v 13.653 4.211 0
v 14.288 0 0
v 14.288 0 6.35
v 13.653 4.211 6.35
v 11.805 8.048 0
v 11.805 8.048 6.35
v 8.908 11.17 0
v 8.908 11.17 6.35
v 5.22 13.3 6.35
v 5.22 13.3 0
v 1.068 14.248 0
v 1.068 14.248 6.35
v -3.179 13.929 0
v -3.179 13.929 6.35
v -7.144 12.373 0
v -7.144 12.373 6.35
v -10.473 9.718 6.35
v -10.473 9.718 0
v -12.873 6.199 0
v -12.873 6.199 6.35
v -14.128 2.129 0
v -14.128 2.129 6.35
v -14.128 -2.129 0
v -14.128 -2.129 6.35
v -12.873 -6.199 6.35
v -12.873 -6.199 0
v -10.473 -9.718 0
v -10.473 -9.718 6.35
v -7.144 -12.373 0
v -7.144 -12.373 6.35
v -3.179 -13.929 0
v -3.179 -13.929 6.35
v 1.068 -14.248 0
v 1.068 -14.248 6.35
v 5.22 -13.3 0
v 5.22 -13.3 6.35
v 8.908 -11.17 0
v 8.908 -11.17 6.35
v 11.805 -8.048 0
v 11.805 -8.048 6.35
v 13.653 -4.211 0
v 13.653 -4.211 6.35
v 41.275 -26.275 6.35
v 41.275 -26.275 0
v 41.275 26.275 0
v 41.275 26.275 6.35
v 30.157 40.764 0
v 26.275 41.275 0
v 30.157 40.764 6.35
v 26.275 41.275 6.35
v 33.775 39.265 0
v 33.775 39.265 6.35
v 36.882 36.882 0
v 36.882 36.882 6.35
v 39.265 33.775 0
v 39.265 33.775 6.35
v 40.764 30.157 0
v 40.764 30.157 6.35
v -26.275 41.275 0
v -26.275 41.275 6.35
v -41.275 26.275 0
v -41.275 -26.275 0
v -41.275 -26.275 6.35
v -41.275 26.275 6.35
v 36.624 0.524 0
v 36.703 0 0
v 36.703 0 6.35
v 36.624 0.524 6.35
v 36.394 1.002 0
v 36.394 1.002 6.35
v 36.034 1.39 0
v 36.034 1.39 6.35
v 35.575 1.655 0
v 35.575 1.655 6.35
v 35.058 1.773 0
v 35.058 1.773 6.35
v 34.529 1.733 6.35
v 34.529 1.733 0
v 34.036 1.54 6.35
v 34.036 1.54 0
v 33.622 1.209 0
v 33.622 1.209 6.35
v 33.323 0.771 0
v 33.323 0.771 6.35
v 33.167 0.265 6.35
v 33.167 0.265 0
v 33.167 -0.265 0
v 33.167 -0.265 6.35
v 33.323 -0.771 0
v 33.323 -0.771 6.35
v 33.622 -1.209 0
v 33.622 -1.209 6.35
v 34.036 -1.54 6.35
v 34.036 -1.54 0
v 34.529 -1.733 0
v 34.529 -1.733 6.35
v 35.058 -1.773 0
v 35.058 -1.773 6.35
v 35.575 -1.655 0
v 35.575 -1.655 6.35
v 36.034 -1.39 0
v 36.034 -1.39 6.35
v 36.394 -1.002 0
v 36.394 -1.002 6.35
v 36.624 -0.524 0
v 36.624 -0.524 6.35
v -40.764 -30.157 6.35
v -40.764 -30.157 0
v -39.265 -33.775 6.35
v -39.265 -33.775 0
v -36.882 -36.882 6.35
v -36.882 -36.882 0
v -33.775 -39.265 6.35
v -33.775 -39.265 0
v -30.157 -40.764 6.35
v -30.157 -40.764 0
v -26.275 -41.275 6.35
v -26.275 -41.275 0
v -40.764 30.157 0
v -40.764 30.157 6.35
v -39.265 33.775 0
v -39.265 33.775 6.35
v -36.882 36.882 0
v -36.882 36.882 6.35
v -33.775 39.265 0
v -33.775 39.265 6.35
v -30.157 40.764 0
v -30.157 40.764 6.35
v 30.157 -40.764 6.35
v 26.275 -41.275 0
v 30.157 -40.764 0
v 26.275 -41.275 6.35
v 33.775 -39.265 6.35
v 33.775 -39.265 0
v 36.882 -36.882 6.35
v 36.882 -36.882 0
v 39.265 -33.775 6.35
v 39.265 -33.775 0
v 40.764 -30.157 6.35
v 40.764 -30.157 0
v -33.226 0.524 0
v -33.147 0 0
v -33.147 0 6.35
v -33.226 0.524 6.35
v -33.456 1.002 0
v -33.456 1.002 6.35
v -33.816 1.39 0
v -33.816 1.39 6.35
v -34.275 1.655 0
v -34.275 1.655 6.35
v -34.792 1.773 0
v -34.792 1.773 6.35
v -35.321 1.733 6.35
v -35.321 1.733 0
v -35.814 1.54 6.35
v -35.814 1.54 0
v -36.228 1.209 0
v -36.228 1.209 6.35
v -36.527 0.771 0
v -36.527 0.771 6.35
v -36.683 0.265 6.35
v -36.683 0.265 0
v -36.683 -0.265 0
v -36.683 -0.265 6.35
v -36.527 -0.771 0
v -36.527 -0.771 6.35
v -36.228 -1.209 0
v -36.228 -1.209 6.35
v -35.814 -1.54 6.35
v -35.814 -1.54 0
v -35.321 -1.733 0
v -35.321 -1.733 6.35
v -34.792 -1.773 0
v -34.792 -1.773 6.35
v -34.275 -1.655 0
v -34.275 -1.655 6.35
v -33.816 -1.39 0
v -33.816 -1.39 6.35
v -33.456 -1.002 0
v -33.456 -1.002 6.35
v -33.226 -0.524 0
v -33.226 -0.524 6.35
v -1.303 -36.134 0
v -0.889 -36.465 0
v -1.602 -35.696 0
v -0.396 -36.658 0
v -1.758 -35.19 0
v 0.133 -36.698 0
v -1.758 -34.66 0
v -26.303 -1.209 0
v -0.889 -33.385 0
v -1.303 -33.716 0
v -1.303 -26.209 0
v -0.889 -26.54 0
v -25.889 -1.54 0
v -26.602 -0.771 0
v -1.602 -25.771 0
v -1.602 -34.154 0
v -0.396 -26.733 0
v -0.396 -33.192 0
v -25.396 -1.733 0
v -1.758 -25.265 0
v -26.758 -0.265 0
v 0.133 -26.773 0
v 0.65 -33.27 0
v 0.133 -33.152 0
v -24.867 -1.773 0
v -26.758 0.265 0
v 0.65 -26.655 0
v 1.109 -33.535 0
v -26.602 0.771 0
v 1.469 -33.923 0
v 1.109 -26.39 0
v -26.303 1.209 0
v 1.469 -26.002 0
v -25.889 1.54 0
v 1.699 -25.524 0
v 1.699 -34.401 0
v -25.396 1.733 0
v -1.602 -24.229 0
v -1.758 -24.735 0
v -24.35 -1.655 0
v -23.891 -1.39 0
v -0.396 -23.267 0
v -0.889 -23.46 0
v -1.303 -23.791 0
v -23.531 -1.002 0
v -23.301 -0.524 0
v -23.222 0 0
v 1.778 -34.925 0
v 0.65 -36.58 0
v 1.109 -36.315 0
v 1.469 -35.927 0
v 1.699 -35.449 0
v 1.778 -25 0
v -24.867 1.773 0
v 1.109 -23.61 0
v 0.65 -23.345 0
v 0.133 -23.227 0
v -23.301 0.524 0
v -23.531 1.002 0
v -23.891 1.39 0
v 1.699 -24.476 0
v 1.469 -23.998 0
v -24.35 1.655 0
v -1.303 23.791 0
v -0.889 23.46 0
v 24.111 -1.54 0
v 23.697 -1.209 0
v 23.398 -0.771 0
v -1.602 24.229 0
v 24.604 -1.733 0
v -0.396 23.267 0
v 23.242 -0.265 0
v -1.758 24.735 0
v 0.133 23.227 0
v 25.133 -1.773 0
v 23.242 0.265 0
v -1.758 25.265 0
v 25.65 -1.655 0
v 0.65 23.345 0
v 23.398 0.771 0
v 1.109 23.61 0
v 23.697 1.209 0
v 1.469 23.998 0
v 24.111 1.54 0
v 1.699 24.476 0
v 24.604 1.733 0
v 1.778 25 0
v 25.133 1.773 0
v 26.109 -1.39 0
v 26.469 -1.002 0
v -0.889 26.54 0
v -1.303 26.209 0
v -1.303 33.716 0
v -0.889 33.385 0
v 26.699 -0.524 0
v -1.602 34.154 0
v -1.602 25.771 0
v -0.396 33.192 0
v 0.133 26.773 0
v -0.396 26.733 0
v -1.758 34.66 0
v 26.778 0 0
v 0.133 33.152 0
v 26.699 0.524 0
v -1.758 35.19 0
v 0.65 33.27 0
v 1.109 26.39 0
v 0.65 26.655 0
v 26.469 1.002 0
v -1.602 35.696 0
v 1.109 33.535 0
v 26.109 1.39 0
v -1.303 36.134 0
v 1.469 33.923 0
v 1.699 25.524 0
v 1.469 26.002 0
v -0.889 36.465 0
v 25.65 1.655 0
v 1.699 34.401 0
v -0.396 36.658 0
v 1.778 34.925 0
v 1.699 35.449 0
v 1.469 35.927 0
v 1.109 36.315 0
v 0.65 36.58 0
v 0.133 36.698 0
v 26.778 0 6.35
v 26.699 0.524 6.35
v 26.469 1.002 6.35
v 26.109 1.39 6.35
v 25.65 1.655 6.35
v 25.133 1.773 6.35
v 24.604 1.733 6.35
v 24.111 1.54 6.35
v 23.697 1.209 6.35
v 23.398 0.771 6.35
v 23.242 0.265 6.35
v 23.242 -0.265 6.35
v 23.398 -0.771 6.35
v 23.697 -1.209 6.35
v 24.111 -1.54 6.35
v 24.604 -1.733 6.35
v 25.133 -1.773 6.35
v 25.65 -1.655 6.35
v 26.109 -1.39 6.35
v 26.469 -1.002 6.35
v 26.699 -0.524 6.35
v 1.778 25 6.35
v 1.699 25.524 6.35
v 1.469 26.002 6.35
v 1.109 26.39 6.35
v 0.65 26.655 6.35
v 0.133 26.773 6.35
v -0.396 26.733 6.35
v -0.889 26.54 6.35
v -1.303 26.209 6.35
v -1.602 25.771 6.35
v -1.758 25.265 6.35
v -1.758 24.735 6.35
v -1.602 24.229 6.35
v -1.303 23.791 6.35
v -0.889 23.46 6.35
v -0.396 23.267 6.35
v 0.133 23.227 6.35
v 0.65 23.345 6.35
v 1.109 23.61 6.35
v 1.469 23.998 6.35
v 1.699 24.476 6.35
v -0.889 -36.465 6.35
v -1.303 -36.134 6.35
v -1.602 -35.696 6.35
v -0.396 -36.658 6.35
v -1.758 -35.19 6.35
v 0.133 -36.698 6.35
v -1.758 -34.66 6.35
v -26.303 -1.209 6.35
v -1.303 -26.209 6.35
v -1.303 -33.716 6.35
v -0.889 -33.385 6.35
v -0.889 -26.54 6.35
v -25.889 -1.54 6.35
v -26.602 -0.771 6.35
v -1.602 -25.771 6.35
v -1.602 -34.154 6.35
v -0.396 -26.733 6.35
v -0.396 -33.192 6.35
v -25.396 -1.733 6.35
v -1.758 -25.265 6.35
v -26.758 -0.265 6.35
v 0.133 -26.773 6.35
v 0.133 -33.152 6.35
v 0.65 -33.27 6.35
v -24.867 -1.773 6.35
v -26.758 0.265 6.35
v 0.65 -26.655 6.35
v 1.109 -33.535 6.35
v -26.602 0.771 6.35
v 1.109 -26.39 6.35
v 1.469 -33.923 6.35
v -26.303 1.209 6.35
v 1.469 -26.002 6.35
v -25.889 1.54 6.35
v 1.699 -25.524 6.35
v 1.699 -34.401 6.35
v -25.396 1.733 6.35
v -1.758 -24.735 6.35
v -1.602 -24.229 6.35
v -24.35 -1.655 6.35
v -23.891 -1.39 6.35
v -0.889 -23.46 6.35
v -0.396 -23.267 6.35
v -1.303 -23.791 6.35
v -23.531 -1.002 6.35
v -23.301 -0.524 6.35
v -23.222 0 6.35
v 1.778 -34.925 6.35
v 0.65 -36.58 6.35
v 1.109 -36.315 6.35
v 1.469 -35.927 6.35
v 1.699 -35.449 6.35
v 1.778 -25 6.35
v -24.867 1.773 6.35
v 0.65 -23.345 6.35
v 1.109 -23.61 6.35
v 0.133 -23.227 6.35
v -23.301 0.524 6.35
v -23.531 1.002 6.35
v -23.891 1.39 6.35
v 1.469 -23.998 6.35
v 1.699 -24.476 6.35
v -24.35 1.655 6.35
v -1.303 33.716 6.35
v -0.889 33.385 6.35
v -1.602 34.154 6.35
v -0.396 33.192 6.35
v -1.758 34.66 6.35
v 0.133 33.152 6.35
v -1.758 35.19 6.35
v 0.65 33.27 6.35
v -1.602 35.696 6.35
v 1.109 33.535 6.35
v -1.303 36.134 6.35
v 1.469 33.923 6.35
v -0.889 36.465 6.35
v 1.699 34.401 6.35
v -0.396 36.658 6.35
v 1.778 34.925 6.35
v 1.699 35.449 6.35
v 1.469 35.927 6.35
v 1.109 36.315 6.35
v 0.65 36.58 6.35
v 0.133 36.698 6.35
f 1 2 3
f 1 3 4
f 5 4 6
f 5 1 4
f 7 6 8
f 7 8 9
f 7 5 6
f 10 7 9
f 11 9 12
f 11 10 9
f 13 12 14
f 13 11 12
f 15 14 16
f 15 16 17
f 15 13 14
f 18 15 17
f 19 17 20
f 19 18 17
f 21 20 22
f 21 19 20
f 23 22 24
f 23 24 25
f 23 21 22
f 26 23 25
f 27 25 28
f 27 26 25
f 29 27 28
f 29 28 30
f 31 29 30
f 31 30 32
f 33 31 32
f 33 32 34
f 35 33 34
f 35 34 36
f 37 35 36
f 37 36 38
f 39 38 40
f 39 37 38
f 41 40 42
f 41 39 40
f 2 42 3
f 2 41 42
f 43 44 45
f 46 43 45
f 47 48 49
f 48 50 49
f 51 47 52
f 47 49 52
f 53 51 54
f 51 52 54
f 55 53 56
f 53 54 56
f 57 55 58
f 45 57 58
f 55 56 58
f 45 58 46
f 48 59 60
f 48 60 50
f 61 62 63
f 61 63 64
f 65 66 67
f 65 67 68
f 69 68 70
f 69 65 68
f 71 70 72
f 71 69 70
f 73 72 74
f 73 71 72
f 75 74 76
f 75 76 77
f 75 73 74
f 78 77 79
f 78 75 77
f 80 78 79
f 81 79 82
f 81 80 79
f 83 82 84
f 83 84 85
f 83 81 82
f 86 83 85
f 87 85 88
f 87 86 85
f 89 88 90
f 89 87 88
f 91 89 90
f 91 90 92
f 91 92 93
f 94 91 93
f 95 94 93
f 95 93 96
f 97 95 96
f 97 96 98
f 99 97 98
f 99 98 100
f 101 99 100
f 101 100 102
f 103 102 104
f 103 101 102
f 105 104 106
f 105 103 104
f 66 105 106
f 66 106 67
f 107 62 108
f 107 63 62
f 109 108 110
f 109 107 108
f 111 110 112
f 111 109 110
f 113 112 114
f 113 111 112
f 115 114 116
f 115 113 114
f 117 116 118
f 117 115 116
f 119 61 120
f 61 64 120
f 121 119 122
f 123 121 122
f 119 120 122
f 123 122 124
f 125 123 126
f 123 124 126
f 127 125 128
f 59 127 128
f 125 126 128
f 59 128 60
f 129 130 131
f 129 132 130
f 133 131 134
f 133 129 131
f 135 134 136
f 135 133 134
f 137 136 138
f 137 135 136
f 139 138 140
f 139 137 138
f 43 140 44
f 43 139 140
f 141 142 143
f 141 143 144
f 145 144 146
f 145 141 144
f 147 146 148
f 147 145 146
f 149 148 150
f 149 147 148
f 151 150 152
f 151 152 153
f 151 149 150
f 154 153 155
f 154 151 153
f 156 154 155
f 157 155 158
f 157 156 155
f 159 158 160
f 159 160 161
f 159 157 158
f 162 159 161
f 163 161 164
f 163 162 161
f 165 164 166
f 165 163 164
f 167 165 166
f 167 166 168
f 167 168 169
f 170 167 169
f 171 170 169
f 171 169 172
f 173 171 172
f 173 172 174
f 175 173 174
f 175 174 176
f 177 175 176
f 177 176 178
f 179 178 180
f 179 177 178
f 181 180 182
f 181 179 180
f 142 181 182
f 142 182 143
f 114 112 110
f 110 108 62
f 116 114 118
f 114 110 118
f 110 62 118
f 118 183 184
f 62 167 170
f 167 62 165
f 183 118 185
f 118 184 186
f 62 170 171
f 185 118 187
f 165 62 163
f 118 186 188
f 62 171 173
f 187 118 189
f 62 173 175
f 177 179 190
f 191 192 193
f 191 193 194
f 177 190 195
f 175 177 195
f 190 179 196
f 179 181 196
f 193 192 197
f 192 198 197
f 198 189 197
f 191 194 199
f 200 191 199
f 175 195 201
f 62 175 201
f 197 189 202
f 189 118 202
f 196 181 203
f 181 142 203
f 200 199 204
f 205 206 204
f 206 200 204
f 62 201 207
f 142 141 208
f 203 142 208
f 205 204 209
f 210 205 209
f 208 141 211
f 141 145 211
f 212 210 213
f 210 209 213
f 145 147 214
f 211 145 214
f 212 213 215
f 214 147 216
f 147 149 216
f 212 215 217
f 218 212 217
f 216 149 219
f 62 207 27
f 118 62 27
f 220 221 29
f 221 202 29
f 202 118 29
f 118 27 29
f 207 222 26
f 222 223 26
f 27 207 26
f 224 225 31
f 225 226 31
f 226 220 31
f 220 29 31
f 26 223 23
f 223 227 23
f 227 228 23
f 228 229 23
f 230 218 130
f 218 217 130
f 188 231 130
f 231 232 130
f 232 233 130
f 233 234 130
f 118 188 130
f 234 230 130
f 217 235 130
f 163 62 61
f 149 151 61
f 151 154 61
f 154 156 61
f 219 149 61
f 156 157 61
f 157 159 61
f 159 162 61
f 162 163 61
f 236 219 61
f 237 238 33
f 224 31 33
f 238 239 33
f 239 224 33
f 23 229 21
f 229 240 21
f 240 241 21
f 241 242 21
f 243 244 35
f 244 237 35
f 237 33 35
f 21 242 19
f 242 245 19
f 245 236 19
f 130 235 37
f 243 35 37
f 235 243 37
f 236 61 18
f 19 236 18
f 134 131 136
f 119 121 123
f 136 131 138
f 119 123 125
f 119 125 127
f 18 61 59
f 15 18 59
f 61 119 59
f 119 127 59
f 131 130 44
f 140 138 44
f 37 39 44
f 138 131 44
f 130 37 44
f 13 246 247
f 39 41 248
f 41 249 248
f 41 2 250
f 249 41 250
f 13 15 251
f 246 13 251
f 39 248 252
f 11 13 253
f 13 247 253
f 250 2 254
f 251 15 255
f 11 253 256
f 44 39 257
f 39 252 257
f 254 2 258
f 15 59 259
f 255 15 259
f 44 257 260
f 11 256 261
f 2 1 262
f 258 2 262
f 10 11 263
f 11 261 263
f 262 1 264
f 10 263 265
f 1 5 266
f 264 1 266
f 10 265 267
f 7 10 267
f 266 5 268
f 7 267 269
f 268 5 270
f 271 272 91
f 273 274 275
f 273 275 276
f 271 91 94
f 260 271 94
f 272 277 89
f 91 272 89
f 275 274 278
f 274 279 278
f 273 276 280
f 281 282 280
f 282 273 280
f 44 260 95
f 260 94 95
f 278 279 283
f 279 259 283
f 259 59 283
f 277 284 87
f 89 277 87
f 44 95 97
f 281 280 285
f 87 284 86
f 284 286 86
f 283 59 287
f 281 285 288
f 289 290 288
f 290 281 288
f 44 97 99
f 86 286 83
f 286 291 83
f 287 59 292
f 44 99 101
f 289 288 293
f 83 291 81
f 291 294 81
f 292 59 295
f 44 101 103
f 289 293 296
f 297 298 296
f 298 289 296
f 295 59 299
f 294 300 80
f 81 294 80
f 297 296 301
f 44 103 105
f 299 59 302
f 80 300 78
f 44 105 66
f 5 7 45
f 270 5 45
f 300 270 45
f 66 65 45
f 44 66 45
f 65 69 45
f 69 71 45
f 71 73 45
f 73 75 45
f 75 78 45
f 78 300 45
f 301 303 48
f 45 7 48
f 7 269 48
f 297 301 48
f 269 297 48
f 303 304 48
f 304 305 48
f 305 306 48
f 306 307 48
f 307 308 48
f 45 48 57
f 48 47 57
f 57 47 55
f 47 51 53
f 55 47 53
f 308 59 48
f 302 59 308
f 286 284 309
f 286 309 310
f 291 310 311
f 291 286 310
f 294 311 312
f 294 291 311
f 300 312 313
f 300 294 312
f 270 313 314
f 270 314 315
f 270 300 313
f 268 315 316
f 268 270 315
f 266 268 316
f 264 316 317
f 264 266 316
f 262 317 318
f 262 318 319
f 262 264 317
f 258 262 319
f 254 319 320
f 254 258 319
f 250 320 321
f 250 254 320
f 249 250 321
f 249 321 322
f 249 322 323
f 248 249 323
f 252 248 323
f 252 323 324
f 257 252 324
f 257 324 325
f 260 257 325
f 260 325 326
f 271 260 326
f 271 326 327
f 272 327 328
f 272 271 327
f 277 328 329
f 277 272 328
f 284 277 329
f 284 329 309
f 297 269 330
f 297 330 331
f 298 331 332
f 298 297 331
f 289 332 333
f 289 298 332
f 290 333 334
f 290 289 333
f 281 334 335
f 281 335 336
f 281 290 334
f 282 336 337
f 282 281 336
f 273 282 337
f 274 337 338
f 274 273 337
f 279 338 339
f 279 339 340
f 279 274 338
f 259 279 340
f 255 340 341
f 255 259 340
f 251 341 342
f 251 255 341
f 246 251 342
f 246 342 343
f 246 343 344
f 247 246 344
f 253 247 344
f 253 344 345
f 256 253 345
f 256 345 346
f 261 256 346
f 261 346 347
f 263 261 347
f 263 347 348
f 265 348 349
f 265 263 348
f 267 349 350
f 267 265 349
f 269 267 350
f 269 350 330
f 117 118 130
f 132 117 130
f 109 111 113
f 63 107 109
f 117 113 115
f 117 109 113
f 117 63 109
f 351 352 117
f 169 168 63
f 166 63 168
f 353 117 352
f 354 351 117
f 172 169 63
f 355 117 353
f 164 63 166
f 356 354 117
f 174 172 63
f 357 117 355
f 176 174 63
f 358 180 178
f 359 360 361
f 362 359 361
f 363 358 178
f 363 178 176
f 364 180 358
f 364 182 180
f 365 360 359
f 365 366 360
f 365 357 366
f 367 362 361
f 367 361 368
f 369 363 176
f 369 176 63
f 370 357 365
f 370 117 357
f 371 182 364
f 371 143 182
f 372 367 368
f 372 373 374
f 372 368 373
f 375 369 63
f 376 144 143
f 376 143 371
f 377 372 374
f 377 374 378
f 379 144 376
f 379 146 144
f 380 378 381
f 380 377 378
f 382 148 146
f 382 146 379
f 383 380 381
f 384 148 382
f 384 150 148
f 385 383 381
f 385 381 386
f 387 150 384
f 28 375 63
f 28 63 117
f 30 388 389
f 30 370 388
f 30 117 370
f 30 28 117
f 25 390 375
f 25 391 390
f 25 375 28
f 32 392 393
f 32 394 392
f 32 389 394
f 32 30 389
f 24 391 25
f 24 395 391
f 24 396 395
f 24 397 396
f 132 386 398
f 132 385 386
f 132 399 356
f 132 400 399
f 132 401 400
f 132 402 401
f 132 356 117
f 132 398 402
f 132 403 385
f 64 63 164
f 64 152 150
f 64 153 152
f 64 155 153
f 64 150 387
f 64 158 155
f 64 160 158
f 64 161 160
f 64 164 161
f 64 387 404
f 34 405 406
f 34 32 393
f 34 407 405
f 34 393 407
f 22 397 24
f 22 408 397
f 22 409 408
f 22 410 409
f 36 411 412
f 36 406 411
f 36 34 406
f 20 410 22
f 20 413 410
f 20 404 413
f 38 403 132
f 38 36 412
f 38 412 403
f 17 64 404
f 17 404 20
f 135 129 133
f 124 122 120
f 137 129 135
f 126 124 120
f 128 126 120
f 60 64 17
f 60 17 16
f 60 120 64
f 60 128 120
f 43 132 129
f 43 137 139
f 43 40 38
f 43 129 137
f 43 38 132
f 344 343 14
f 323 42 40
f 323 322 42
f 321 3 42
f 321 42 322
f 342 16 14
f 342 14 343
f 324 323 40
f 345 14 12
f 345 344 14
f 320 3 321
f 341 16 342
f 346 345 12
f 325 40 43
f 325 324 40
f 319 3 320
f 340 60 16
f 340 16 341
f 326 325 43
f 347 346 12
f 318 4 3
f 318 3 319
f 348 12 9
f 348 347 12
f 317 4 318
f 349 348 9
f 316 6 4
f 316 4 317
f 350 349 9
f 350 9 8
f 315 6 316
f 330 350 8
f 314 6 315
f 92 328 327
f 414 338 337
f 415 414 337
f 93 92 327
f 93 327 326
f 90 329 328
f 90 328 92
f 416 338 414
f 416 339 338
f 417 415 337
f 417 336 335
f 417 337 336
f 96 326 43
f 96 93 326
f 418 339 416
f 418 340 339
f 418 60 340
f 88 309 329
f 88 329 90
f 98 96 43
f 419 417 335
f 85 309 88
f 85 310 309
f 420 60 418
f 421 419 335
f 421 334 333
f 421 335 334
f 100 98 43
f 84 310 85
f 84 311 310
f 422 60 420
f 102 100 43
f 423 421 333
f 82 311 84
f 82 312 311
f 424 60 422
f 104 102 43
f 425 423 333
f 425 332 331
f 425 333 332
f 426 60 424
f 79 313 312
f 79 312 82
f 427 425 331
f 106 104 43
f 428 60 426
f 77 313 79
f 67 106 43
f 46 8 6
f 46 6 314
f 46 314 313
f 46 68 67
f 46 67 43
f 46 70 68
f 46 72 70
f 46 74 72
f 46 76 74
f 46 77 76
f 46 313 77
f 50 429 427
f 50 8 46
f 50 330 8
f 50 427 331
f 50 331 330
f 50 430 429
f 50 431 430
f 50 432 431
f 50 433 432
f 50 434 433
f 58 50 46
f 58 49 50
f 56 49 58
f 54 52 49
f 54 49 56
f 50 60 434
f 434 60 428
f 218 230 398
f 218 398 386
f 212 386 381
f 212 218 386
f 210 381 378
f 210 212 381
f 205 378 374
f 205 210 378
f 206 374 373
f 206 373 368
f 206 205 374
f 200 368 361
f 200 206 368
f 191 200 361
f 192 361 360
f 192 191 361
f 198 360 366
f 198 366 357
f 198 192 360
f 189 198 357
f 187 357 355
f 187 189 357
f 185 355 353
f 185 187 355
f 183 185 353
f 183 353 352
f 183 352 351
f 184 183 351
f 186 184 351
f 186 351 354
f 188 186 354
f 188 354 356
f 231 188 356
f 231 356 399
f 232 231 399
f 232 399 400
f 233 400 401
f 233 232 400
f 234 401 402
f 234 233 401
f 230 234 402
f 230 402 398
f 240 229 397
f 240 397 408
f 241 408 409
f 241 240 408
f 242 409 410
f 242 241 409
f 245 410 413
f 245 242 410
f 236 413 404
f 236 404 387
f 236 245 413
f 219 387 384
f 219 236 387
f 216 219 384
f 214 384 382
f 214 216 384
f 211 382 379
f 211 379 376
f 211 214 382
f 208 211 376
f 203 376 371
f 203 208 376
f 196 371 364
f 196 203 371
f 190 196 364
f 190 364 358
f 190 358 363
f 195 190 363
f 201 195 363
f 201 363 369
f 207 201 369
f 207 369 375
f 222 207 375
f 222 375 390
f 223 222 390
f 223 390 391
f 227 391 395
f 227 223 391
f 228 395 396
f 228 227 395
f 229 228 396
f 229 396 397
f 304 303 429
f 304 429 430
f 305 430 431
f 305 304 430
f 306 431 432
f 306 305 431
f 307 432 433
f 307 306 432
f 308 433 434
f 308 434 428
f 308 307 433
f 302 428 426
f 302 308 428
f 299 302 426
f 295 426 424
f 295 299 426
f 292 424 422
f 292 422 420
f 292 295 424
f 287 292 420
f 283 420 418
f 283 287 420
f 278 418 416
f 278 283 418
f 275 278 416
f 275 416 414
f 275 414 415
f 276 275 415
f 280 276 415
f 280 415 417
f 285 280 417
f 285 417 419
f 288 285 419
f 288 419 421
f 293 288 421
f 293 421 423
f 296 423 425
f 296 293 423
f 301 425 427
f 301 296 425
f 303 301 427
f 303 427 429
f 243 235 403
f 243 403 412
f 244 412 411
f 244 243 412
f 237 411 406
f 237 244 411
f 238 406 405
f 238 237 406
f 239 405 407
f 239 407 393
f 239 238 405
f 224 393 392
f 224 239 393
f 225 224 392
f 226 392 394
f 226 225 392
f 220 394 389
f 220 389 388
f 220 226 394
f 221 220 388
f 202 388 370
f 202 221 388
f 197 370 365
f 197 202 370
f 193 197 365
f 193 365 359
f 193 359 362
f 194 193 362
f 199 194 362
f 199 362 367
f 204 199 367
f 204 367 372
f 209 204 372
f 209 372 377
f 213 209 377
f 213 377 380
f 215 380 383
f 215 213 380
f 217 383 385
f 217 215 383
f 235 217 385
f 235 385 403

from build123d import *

# Parameters (mm, degrees)
F0_W     = 82.55
F0_H     = 82.55
F0_R     = 1.778
F0_R_2   = 14.2875
F1_DEPTH = 6.35
F2_R     = 15


# Not quite as in the source:
# - a length typed as a fraction of an inch, garbled in the dataset ("3 / 203.2 mm" for 3/8 in), is restored


with BuildPart() as f1:
    # F0 (on Top) → F1 (new body)
    with BuildSketch(Plane.XY):
        Rectangle(F0_W, F0_H)
        with Locations((0, -34.925)):
            Circle(F0_R, mode=Mode.SUBTRACT)
        with Locations((0, -25)):
            Circle(F0_R, mode=Mode.SUBTRACT)
        with Locations((-34.925, 0)):
            Circle(F0_R, mode=Mode.SUBTRACT)
        with Locations((-25, 0)):
            Circle(F0_R, mode=Mode.SUBTRACT)
        Circle(F0_R_2, mode=Mode.SUBTRACT)
        with Locations((25, 0)):
            Circle(F0_R, mode=Mode.SUBTRACT)
        with Locations((34.925, 0)):
            Circle(F0_R, mode=Mode.SUBTRACT)
        with Locations((0, 25)):
            Circle(F0_R, mode=Mode.SUBTRACT)
        with Locations((0, 34.925)):
            Circle(F0_R, mode=Mode.SUBTRACT)
    extrude(amount=F1_DEPTH)

    # F2
    f2_edges = [f1.edges().sort_by_distance(p)[0] for p in [
        (-41.275, 41.275, 3.175),
        (-41.275, -41.275, 3.175),
        (41.275, 41.275, 3.175),
        (41.275, -41.275, 3.175),
    ]]
    fillet(f2_edges, radius=F2_R)


solid = f1.part
